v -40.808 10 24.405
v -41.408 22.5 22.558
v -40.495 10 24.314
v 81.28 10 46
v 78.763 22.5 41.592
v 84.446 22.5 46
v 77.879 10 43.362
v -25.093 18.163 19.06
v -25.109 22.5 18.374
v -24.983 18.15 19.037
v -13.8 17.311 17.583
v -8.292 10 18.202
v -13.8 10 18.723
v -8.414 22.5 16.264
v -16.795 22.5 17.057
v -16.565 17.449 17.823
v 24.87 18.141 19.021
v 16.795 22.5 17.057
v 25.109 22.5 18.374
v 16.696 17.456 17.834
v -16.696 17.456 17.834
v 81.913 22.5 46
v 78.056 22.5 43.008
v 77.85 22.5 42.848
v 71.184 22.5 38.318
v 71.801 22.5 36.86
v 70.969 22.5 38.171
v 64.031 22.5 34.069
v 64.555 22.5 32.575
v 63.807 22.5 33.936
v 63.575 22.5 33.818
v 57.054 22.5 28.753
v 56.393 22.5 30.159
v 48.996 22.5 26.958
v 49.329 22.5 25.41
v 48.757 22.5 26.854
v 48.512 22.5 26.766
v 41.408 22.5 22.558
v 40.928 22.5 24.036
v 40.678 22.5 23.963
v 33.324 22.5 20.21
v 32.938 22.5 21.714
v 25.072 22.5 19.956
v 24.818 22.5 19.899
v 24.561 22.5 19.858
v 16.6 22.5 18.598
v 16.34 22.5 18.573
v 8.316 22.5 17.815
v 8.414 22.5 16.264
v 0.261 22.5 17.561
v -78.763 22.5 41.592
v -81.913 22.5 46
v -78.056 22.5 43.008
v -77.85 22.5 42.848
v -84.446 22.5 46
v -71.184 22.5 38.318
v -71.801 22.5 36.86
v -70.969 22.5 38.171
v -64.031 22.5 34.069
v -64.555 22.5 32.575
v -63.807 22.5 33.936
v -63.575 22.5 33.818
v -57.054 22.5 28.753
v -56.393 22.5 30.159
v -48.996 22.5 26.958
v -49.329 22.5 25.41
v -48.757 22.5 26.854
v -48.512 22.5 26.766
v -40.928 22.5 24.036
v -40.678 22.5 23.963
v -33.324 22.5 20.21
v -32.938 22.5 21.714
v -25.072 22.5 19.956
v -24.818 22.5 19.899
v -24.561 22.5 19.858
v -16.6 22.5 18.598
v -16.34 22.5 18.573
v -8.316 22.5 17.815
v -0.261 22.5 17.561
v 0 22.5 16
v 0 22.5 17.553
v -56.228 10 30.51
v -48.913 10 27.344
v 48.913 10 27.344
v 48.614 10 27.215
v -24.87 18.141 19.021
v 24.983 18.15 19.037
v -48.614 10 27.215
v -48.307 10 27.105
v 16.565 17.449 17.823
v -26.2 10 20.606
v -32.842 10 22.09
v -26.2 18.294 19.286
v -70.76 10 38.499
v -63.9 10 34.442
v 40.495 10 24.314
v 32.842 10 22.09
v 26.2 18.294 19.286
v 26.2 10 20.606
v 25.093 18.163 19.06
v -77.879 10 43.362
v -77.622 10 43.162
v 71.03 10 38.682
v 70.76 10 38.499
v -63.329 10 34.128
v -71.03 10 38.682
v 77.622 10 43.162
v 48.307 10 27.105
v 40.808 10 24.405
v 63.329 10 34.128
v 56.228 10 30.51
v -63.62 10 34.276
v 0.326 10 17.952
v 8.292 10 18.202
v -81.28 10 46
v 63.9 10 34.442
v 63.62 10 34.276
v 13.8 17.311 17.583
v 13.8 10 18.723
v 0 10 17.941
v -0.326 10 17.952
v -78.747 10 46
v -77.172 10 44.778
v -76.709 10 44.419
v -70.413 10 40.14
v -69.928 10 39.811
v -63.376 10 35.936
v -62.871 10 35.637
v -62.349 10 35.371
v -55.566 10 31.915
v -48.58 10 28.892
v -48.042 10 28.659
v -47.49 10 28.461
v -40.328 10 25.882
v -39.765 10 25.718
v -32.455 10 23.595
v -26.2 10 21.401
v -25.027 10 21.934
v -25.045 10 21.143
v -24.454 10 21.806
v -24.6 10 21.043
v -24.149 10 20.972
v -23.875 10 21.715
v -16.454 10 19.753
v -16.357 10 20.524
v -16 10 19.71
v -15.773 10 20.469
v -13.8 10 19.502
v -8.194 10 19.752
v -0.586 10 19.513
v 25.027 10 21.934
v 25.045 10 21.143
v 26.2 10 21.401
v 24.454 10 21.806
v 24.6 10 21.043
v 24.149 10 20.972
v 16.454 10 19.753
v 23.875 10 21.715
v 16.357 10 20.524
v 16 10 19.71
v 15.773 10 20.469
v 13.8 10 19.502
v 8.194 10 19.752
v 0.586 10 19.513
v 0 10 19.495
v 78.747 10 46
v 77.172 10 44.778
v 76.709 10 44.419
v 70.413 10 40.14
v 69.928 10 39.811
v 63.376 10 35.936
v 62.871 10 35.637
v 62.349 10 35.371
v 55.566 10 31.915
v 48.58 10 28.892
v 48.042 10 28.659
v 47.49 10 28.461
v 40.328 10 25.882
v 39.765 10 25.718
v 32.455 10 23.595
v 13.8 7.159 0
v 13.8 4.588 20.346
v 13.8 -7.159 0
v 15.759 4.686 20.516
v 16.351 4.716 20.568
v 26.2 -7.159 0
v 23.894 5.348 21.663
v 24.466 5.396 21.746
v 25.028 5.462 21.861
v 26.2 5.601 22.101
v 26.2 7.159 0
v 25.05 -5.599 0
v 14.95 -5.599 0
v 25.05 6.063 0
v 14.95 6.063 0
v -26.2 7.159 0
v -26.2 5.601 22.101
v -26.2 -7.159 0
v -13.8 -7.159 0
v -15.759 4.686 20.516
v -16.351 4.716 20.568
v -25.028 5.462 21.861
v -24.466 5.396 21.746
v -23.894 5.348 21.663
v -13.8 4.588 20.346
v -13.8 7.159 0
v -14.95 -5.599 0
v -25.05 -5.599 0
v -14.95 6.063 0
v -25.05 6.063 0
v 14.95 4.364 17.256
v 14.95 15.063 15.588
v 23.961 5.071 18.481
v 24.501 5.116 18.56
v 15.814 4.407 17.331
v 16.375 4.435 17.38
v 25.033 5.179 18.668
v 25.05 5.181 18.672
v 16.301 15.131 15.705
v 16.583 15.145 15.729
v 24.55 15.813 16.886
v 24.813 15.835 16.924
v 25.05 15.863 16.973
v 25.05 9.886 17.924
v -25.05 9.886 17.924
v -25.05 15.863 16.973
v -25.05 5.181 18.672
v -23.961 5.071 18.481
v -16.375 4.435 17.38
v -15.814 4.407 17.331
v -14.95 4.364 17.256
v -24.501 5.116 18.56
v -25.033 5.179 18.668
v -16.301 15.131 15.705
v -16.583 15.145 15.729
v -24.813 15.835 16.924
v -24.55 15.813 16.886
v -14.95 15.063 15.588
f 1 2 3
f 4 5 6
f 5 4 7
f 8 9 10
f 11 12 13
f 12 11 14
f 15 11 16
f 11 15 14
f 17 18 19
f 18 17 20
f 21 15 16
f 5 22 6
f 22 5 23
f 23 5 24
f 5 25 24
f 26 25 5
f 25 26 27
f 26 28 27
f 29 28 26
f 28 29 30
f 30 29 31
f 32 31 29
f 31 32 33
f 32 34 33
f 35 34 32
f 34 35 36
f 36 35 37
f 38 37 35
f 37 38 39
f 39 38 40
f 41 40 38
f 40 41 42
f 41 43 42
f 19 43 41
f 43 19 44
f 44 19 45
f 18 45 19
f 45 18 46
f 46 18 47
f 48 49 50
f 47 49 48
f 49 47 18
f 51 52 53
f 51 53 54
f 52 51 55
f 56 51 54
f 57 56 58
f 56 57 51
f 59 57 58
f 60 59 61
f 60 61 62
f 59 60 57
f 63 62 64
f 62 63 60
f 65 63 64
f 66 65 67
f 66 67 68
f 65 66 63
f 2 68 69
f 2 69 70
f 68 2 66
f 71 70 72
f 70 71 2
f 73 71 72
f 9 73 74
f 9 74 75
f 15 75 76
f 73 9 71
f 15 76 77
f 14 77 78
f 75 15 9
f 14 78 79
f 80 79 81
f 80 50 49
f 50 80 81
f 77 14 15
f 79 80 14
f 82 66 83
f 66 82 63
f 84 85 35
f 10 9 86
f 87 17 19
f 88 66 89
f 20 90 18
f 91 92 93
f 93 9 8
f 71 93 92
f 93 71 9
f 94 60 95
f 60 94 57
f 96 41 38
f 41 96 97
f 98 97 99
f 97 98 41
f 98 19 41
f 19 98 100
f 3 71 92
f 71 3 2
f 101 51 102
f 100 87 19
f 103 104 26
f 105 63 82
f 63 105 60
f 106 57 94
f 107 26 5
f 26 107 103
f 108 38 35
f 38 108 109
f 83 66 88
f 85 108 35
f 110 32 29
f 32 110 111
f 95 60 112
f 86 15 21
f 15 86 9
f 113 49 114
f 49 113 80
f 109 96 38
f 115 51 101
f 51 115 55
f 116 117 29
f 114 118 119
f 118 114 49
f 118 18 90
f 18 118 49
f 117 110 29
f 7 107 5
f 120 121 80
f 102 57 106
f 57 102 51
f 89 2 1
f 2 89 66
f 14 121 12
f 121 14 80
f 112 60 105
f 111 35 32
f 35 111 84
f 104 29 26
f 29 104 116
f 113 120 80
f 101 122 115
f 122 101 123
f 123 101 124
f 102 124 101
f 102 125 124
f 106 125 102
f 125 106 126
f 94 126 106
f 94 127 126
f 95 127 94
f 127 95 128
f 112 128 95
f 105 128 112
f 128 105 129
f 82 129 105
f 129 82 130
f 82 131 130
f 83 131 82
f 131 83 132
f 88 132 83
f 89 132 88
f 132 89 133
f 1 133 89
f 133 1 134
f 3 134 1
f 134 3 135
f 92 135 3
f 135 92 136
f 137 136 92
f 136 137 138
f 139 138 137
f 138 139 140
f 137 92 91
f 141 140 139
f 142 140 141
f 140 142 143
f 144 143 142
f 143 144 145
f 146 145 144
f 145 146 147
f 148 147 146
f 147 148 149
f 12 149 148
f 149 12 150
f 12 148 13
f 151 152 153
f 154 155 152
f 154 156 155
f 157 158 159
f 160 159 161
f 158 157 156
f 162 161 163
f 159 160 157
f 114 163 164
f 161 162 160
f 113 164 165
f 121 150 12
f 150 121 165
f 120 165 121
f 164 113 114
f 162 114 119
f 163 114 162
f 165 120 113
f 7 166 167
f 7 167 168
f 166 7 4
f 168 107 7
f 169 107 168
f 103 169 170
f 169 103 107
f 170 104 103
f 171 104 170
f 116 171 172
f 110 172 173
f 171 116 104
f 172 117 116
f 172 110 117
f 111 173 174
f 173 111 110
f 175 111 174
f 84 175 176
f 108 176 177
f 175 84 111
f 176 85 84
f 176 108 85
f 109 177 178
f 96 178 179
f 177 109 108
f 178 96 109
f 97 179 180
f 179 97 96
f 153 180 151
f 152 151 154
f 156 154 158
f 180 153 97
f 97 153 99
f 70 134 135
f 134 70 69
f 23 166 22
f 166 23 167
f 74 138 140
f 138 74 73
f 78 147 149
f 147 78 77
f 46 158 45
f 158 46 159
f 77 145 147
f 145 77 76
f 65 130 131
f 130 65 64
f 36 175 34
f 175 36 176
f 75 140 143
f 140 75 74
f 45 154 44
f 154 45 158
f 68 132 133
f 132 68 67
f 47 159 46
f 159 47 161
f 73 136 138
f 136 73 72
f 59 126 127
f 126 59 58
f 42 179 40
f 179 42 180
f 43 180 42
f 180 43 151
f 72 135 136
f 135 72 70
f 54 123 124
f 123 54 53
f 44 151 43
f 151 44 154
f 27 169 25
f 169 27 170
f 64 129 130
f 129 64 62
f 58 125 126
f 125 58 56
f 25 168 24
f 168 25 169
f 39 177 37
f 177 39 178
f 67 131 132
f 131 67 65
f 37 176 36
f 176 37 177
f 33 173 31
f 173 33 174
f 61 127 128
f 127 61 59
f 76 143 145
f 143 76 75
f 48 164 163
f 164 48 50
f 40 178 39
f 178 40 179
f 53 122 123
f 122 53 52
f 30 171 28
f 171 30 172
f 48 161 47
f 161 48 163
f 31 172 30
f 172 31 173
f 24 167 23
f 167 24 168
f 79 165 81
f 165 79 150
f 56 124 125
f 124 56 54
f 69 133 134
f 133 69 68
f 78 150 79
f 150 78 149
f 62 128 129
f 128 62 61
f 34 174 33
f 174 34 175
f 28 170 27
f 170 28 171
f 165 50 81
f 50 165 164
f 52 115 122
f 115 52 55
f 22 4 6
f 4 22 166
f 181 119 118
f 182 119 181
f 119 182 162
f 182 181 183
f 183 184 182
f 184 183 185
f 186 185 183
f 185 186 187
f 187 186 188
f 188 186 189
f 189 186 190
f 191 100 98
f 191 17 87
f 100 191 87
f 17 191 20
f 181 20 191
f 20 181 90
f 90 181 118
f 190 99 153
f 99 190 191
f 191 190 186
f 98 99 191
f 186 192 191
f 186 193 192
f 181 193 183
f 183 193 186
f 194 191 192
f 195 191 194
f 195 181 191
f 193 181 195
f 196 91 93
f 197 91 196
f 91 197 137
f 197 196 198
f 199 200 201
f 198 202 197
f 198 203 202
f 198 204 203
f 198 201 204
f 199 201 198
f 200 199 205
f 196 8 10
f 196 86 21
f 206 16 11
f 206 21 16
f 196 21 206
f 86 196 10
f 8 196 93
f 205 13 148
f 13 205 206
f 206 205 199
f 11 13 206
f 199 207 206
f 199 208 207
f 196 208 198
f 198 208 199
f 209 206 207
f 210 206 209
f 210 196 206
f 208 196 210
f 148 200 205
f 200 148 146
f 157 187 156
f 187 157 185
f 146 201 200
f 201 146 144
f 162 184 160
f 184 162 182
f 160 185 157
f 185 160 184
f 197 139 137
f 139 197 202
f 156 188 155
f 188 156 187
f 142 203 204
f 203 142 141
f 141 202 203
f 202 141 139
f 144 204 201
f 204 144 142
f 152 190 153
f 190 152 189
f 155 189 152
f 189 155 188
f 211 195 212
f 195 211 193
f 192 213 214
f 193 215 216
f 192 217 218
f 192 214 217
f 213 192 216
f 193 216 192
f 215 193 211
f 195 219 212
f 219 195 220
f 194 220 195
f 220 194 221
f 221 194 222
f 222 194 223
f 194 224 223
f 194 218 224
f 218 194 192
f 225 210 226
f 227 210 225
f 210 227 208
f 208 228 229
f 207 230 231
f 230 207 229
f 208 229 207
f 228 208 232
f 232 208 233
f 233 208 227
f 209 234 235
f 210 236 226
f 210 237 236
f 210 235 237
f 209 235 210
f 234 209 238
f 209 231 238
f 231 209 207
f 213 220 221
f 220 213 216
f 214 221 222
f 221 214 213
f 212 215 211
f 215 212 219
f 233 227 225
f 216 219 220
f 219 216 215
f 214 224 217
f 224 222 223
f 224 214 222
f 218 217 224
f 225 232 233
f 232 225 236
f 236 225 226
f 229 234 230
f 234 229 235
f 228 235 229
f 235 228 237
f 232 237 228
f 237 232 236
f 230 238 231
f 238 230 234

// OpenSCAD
$fn=100;

mount_w = 70;
mount_h = 50;
mount_d = 5;

stick_distance = 20; // Distance of each stick from the center

bucket_height   = 235;
bucket_d_top    = 268;
bucket_d_bottom = 195;

// bucket();

tolerance = 0.1;

difference() {
    new_holder();
    translate([0, -1.5, -3]) bucket_holder(10+tolerance, 10+tolerance, 90);
}

module new_holder() {
    color ([1,0,0]) rim();

    difference() {
        sticks (12.4, 12.4, 90);
        bucket();
     }
}

module rim() {
    translate([0,-5,0])
    difference() {
        bucket();
        translate([0, -bucket_height, 150]) cube([bucket_d_top, 500, bucket_d_top], center=true);
        translate([0,10,0]) bucket();
        translate([0, 0, 150+30]) cube([bucket_d_top, 500, bucket_d_top], center=true);
    }
}

// --------------------------------------------------
// Original Bucket holder
// --------------------------------------------------

module bucket_holder(sw=10, sh=10, sd=90) {
    color([0.5, 0.5, 0.5]) cube([mount_w, mount_h, mount_d], center=true);

    color([0.5, 0.5, 0.5])  difference() {
        sticks(sw, sh, sd);
        bucket();
    }
}

module sticks(w=10, h=10, d=90) {
    translate([ stick_distance, 0, 0]) stick(w, h, d);
    translate([-stick_distance, 0, 0]) stick(w, h, d);
}

module stick(w=10, h=10, d=90) {
    intersection() {
        rotate([ 60, 0, 0])
            cube([w, d, h], center=true);
        translate([0, 0, 20])
            cube([mount_w, mount_h, 40], center=true);
    }
}

module bucket() {
    translate([0, -90, 150])
        rotate([-90,0,0])
            cylinder(
                h = bucket_height,
                d1 = bucket_d_bottom,
                d2 = bucket_d_top,
                center = true
             );
}
